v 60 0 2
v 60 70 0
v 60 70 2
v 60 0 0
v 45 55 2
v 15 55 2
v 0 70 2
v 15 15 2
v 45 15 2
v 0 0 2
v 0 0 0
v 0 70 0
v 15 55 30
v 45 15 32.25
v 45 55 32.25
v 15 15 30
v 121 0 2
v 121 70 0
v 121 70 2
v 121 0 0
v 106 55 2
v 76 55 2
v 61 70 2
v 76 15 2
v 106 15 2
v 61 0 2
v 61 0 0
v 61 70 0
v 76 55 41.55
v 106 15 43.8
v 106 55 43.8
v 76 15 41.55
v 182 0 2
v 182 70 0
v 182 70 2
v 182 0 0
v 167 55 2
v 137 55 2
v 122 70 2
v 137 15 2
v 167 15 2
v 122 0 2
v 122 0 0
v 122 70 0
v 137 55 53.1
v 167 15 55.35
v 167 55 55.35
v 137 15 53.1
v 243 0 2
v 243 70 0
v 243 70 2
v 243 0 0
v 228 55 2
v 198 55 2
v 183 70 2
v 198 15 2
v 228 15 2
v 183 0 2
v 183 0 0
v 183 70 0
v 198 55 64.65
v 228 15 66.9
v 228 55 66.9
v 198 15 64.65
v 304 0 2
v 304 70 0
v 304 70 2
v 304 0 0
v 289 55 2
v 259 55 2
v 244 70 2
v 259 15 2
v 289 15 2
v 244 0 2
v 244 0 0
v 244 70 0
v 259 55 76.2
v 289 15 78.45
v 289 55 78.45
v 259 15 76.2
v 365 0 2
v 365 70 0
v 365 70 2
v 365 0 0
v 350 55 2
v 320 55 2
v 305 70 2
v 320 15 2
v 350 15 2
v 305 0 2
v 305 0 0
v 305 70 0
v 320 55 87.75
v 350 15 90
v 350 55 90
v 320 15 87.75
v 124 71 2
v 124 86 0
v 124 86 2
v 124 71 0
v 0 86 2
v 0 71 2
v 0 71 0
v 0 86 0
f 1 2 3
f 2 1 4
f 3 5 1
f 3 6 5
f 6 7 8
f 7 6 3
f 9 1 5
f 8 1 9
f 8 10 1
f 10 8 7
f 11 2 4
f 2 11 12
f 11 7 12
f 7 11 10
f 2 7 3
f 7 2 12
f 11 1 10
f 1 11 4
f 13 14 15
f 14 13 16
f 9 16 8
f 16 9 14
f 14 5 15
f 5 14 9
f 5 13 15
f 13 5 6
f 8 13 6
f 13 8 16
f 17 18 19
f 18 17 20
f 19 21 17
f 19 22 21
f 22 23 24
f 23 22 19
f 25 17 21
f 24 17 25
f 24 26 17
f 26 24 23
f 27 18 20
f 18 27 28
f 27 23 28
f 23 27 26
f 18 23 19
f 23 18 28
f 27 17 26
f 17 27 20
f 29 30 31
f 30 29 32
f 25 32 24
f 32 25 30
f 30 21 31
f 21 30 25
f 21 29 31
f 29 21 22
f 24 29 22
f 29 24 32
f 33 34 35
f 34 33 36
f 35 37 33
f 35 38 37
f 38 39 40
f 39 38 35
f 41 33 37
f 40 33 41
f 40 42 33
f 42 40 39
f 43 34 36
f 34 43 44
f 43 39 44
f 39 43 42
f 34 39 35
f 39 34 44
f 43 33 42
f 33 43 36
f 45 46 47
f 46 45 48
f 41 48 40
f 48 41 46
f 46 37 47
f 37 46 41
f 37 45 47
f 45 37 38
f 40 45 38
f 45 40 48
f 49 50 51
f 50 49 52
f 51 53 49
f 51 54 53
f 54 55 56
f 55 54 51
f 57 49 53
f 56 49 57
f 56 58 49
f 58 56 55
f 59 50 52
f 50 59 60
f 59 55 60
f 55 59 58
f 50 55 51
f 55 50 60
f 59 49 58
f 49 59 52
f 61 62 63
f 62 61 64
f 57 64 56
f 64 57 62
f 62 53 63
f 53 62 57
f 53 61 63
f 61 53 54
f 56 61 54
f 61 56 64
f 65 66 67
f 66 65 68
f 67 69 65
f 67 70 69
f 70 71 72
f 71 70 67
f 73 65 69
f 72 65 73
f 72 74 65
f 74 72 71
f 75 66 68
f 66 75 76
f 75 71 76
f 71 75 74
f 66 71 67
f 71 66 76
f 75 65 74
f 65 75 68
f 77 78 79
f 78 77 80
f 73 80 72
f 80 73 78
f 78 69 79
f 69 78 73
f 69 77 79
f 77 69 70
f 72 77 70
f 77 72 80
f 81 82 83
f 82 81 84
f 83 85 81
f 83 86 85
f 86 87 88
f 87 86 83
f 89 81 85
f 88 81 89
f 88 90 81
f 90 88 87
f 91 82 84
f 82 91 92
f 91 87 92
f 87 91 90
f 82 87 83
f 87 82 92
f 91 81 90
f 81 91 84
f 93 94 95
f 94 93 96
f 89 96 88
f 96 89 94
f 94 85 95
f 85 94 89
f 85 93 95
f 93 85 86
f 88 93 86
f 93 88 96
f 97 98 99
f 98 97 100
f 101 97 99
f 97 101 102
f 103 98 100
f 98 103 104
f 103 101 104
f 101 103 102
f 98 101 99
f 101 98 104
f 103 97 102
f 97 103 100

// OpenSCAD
/*
    Angled_Platform_Pillars.scad
    ────────────────────────────
    A row of rectangular-section pillars with sloped tops for carrying an
    inclined platform.  All pillars lie under the same inclined plane, so the
    slope on every top face is identical.

    Coordinate system
    ─────────────────
    Pillar row runs along +X (slope direction).
    Each pillar is pillar_length (X) × pillar_width (Y).
    Bottom of every pillar at Z = 0.
    The pillar tops support a board whose underside is at height_start at X = 0
    and at height_end at X = board_length.
    The real-world spacing between pillars on the layout is derived
    automatically so that the pillars are evenly distributed across the full
    board_length:

      layout_gap = (board_length − num_pillars × pillar_length) / (num_pillars − 1)

    print_gap controls the clear space between adjacent rims in the printed
    model only and does not affect the slope calculation.

    Slope definition
    ────────────────
    The slope is specified in terms of the board sitting on the pillars:
      board_length  – horizontal distance over which the height changes
      height_start  – board height at X = 0   (underside of board / pillar top)
      height_end    – board height at X = board_length

      slope_angle = atan((height_end − height_start) / board_length)

    This angle is the same for every pillar top face and is echoed to the
    console on render.  It is NOT a free parameter.

    Rim
    ───
    Each pillar stands on a flat rim (flange) that extends rim_width mm beyond
    the pillar on all four sides and is 2 mm tall.  This prevents toppling
    during installation.  In the printed model the gap between adjacent rims
    is print_gap mm.

    Gauge strip
    ───────────
    When show_gauge = true, (num_pillars − 1) flat strips are rendered, one
    per inter-pillar gap.  Each strip is exactly layout_gap long, 15 mm wide,
    and 2 mm tall — use one as a positioning aid when placing pillars on the
    layout.  Strips are placed behind the pillar row (offset in Y).

    Track indent
    ────────────
    When show_track_indent = true, a shallow channel (1.5 mm deep, 26 mm wide,
    full pillar_length in X) is cut into the sloped top face, centred in Y.
    This cradles the Kato track for test-fitting on the pillar.

    Parameters
    ──────────
    num_pillars         Number of pillars in the row.
    pillar_length       Pillar dimension along the slope direction (X) in mm.
    pillar_width        Pillar dimension across the slope direction (Y) in mm.
    rim_width           Rim overhang beyond the pillar on each side in mm.
    print_gap           Clear space between adjacent rims in the printed model
                        (mm ≥ 1).  Does not affect slope.
    board_length        Horizontal span over which the slope is measured (mm).
    height_start        Height of the board's underside at X = 0 (mm).
    height_end          Height of the board's underside at X = board_length (mm).
    show_gauge          true = include spacing gauge strips in the render.
    show_track_indent   true = cut a Kato-track cradle into each sloped top.
*/

/* [Pillars] */
// Number of pillars
num_pillars = 6;

// Pillar dimension along the slope direction (X) in mm
pillar_length = 30; // [1:0.5:100]

// Pillar dimension across the slope direction (Y) in mm
pillar_width = 40; // [1:0.5:100]

// Rim overhang beyond the pillar on each side in mm
rim_width = 15; // [0:0.5:30]

// Clear space between adjacent rims in the printed model in mm
print_gap = 1; // [1:0.5:20]

/* [Board / Slope] */
// Horizontal distance over which the board height changes in mm
board_length = 800; // [1:1:2000]

// Height of the board's underside at the start of the row (X = 0) in mm
height_start = 30; // [0:0.5:200]

// Height of the board's underside at the end of board_length in mm
height_end = 90; // [0:0.5:200]

/* [Gauge] */
// Include spacing gauge strips for layout positioning
show_gauge = true;

// Cut a Kato-track cradle (1.5 mm deep, 26 mm wide) into each sloped top
show_track_indent = false;

/* [Hidden] */
$fn = 32;
_rim_h = 2;        // fixed rim height in mm
_indent_depth = 1.5; // track indent depth in mm
_indent_width = 26;  // Kato track width in mm

// ── Single pillar with sloped top ─────────────────────────────────────────────
//   Low-side bottom corner at origin.  pl = length (X), pw = width (Y).
module _sloped_pillar(pl, pw, h_lo, h_hi) {
    polyhedron(
        points = [
            [0,  0,  0   ], // 0  front-low  (bottom)
            [pl, 0,  0   ], // 1  front-high (bottom)
            [pl, pw, 0   ], // 2  back-high  (bottom)
            [0,  pw, 0   ], // 3  back-low   (bottom)
            [0,  0,  h_lo], // 4  front-low  (top)
            [pl, 0,  h_hi], // 5  front-high (top)
            [pl, pw, h_hi], // 6  back-high  (top)
            [0,  pw, h_lo], // 7  back-low   (top)
        ],
        faces = [
            [0, 3, 2, 1], // bottom
            [4, 5, 6, 7], // top (sloped)
            [0, 1, 5, 4], // front (−Y)
            [1, 2, 6, 5], // right (+X, high side)
            [2, 3, 7, 6], // back  (+Y)
            [3, 0, 4, 7], // left  (−X, low side)
        ]
    );
}

// ── Track indent cutter ───────────────────────────────────────────────────────
//   Sloped polyhedron matching the top face, used in difference() to carve a
//   channel centred in Y. eps pushes the cutter just above the surface.
module _track_indent_cut(pl, pw, h_lo, h_hi, depth, width) {
    eps = 0.01;
    y0  = (pw - width) / 2;
    y1  = (pw + width) / 2;
    polyhedron(
        points = [
            [0,  y0, h_lo - depth], // 0
            [pl, y0, h_hi - depth], // 1
            [pl, y1, h_hi - depth], // 2
            [0,  y1, h_lo - depth], // 3
            [0,  y0, h_lo + eps  ], // 4
            [pl, y0, h_hi + eps  ], // 5
            [pl, y1, h_hi + eps  ], // 6
            [0,  y1, h_lo + eps  ], // 7
        ],
        faces = [
            [0, 3, 2, 1],
            [4, 5, 6, 7],
            [0, 1, 5, 4],
            [1, 2, 6, 5],
            [2, 3, 7, 6],
            [3, 0, 4, 7],
        ]
    );
}

// ── Row of angled-platform pillars ────────────────────────────────────────────
module angled_platform_pillars(
    num_pillars,
    pillar_length,
    pillar_width,
    rim_width         = 15,
    print_gap         = 1,
    board_length      = 800,
    height_start      = 30,
    height_end        = 90,
    show_gauge        = true,
    show_track_indent = false
) {
    pl  = pillar_length;
    pw  = pillar_width;
    rw  = rim_width;
    n   = num_pillars;
    pg  = print_gap;
    bl  = board_length;
    hs  = height_start;
    he  = height_end;

    // Layout gap: evenly distribute pillar bodies across board_length
    lg = (bl - n * pl) / (n - 1);

    // Slope rate: height gained per mm of horizontal travel
    slope = (he - hs) / bl;

    // Unit pitch in the printed model: rim + pillar + rim + gap
    unit_w = pl + 2 * rw + pg;

    // Informational echoes
    echo(str("slope_angle     = ", atan(slope), "°"));
    echo(str("layout_gap      = ", lg, " mm"));
    echo(str("print_row_span  = ", n * (pl + 2*rw) + (n-1) * pg, " mm"));

    // ── Pillars ──────────────────────────────────────────────────────────────
    for (i = [0 : n - 1]) {
        // Layout X positions → determine heights
        layout_x_lo = i * (pl + lg);
        layout_x_hi = layout_x_lo + pl;
        h_lo = hs + layout_x_lo * slope;
        h_hi = hs + layout_x_hi * slope;

        // Each unit origin is at the rim's low-X, low-Y corner
        translate([i * unit_w, 0, 0]) {
            // Rim (flat flange around the base)
            cube([pl + 2*rw, pw + 2*rw, _rim_h]);
            // Pillar body, offset so rim extends rw on all sides
            translate([rw, rw, 0])
                if (show_track_indent)
                    difference() {
                        _sloped_pillar(pl, pw, h_lo, h_hi);
                        _track_indent_cut(pl, pw, h_lo, h_hi,
                                          _indent_depth, _indent_width);
                    }
                else
                    _sloped_pillar(pl, pw, h_lo, h_hi);
        }
    }

    // ── Gauge strip (optional) ───────────────────────────────────────────────────────────────────────────────────────
    //   A single strip exactly layout_gap × 15 × 2 mm — all gaps are equal so
    //   one is enough.  Placed behind the pillar row (Y offset = pw + 2*rw + pg).
    if (show_gauge)
        translate([0, pw + 2*rw + pg, 0])
            cube([lg, 15, 2]);
}

// ── Render ────────────────────────────────────────────────────────────────────
angled_platform_pillars(
    num_pillars,
    pillar_length,
    pillar_width,
    rim_width,
    print_gap,
    board_length,
    height_start,
    height_end,
    show_gauge,
    show_track_indent
);
